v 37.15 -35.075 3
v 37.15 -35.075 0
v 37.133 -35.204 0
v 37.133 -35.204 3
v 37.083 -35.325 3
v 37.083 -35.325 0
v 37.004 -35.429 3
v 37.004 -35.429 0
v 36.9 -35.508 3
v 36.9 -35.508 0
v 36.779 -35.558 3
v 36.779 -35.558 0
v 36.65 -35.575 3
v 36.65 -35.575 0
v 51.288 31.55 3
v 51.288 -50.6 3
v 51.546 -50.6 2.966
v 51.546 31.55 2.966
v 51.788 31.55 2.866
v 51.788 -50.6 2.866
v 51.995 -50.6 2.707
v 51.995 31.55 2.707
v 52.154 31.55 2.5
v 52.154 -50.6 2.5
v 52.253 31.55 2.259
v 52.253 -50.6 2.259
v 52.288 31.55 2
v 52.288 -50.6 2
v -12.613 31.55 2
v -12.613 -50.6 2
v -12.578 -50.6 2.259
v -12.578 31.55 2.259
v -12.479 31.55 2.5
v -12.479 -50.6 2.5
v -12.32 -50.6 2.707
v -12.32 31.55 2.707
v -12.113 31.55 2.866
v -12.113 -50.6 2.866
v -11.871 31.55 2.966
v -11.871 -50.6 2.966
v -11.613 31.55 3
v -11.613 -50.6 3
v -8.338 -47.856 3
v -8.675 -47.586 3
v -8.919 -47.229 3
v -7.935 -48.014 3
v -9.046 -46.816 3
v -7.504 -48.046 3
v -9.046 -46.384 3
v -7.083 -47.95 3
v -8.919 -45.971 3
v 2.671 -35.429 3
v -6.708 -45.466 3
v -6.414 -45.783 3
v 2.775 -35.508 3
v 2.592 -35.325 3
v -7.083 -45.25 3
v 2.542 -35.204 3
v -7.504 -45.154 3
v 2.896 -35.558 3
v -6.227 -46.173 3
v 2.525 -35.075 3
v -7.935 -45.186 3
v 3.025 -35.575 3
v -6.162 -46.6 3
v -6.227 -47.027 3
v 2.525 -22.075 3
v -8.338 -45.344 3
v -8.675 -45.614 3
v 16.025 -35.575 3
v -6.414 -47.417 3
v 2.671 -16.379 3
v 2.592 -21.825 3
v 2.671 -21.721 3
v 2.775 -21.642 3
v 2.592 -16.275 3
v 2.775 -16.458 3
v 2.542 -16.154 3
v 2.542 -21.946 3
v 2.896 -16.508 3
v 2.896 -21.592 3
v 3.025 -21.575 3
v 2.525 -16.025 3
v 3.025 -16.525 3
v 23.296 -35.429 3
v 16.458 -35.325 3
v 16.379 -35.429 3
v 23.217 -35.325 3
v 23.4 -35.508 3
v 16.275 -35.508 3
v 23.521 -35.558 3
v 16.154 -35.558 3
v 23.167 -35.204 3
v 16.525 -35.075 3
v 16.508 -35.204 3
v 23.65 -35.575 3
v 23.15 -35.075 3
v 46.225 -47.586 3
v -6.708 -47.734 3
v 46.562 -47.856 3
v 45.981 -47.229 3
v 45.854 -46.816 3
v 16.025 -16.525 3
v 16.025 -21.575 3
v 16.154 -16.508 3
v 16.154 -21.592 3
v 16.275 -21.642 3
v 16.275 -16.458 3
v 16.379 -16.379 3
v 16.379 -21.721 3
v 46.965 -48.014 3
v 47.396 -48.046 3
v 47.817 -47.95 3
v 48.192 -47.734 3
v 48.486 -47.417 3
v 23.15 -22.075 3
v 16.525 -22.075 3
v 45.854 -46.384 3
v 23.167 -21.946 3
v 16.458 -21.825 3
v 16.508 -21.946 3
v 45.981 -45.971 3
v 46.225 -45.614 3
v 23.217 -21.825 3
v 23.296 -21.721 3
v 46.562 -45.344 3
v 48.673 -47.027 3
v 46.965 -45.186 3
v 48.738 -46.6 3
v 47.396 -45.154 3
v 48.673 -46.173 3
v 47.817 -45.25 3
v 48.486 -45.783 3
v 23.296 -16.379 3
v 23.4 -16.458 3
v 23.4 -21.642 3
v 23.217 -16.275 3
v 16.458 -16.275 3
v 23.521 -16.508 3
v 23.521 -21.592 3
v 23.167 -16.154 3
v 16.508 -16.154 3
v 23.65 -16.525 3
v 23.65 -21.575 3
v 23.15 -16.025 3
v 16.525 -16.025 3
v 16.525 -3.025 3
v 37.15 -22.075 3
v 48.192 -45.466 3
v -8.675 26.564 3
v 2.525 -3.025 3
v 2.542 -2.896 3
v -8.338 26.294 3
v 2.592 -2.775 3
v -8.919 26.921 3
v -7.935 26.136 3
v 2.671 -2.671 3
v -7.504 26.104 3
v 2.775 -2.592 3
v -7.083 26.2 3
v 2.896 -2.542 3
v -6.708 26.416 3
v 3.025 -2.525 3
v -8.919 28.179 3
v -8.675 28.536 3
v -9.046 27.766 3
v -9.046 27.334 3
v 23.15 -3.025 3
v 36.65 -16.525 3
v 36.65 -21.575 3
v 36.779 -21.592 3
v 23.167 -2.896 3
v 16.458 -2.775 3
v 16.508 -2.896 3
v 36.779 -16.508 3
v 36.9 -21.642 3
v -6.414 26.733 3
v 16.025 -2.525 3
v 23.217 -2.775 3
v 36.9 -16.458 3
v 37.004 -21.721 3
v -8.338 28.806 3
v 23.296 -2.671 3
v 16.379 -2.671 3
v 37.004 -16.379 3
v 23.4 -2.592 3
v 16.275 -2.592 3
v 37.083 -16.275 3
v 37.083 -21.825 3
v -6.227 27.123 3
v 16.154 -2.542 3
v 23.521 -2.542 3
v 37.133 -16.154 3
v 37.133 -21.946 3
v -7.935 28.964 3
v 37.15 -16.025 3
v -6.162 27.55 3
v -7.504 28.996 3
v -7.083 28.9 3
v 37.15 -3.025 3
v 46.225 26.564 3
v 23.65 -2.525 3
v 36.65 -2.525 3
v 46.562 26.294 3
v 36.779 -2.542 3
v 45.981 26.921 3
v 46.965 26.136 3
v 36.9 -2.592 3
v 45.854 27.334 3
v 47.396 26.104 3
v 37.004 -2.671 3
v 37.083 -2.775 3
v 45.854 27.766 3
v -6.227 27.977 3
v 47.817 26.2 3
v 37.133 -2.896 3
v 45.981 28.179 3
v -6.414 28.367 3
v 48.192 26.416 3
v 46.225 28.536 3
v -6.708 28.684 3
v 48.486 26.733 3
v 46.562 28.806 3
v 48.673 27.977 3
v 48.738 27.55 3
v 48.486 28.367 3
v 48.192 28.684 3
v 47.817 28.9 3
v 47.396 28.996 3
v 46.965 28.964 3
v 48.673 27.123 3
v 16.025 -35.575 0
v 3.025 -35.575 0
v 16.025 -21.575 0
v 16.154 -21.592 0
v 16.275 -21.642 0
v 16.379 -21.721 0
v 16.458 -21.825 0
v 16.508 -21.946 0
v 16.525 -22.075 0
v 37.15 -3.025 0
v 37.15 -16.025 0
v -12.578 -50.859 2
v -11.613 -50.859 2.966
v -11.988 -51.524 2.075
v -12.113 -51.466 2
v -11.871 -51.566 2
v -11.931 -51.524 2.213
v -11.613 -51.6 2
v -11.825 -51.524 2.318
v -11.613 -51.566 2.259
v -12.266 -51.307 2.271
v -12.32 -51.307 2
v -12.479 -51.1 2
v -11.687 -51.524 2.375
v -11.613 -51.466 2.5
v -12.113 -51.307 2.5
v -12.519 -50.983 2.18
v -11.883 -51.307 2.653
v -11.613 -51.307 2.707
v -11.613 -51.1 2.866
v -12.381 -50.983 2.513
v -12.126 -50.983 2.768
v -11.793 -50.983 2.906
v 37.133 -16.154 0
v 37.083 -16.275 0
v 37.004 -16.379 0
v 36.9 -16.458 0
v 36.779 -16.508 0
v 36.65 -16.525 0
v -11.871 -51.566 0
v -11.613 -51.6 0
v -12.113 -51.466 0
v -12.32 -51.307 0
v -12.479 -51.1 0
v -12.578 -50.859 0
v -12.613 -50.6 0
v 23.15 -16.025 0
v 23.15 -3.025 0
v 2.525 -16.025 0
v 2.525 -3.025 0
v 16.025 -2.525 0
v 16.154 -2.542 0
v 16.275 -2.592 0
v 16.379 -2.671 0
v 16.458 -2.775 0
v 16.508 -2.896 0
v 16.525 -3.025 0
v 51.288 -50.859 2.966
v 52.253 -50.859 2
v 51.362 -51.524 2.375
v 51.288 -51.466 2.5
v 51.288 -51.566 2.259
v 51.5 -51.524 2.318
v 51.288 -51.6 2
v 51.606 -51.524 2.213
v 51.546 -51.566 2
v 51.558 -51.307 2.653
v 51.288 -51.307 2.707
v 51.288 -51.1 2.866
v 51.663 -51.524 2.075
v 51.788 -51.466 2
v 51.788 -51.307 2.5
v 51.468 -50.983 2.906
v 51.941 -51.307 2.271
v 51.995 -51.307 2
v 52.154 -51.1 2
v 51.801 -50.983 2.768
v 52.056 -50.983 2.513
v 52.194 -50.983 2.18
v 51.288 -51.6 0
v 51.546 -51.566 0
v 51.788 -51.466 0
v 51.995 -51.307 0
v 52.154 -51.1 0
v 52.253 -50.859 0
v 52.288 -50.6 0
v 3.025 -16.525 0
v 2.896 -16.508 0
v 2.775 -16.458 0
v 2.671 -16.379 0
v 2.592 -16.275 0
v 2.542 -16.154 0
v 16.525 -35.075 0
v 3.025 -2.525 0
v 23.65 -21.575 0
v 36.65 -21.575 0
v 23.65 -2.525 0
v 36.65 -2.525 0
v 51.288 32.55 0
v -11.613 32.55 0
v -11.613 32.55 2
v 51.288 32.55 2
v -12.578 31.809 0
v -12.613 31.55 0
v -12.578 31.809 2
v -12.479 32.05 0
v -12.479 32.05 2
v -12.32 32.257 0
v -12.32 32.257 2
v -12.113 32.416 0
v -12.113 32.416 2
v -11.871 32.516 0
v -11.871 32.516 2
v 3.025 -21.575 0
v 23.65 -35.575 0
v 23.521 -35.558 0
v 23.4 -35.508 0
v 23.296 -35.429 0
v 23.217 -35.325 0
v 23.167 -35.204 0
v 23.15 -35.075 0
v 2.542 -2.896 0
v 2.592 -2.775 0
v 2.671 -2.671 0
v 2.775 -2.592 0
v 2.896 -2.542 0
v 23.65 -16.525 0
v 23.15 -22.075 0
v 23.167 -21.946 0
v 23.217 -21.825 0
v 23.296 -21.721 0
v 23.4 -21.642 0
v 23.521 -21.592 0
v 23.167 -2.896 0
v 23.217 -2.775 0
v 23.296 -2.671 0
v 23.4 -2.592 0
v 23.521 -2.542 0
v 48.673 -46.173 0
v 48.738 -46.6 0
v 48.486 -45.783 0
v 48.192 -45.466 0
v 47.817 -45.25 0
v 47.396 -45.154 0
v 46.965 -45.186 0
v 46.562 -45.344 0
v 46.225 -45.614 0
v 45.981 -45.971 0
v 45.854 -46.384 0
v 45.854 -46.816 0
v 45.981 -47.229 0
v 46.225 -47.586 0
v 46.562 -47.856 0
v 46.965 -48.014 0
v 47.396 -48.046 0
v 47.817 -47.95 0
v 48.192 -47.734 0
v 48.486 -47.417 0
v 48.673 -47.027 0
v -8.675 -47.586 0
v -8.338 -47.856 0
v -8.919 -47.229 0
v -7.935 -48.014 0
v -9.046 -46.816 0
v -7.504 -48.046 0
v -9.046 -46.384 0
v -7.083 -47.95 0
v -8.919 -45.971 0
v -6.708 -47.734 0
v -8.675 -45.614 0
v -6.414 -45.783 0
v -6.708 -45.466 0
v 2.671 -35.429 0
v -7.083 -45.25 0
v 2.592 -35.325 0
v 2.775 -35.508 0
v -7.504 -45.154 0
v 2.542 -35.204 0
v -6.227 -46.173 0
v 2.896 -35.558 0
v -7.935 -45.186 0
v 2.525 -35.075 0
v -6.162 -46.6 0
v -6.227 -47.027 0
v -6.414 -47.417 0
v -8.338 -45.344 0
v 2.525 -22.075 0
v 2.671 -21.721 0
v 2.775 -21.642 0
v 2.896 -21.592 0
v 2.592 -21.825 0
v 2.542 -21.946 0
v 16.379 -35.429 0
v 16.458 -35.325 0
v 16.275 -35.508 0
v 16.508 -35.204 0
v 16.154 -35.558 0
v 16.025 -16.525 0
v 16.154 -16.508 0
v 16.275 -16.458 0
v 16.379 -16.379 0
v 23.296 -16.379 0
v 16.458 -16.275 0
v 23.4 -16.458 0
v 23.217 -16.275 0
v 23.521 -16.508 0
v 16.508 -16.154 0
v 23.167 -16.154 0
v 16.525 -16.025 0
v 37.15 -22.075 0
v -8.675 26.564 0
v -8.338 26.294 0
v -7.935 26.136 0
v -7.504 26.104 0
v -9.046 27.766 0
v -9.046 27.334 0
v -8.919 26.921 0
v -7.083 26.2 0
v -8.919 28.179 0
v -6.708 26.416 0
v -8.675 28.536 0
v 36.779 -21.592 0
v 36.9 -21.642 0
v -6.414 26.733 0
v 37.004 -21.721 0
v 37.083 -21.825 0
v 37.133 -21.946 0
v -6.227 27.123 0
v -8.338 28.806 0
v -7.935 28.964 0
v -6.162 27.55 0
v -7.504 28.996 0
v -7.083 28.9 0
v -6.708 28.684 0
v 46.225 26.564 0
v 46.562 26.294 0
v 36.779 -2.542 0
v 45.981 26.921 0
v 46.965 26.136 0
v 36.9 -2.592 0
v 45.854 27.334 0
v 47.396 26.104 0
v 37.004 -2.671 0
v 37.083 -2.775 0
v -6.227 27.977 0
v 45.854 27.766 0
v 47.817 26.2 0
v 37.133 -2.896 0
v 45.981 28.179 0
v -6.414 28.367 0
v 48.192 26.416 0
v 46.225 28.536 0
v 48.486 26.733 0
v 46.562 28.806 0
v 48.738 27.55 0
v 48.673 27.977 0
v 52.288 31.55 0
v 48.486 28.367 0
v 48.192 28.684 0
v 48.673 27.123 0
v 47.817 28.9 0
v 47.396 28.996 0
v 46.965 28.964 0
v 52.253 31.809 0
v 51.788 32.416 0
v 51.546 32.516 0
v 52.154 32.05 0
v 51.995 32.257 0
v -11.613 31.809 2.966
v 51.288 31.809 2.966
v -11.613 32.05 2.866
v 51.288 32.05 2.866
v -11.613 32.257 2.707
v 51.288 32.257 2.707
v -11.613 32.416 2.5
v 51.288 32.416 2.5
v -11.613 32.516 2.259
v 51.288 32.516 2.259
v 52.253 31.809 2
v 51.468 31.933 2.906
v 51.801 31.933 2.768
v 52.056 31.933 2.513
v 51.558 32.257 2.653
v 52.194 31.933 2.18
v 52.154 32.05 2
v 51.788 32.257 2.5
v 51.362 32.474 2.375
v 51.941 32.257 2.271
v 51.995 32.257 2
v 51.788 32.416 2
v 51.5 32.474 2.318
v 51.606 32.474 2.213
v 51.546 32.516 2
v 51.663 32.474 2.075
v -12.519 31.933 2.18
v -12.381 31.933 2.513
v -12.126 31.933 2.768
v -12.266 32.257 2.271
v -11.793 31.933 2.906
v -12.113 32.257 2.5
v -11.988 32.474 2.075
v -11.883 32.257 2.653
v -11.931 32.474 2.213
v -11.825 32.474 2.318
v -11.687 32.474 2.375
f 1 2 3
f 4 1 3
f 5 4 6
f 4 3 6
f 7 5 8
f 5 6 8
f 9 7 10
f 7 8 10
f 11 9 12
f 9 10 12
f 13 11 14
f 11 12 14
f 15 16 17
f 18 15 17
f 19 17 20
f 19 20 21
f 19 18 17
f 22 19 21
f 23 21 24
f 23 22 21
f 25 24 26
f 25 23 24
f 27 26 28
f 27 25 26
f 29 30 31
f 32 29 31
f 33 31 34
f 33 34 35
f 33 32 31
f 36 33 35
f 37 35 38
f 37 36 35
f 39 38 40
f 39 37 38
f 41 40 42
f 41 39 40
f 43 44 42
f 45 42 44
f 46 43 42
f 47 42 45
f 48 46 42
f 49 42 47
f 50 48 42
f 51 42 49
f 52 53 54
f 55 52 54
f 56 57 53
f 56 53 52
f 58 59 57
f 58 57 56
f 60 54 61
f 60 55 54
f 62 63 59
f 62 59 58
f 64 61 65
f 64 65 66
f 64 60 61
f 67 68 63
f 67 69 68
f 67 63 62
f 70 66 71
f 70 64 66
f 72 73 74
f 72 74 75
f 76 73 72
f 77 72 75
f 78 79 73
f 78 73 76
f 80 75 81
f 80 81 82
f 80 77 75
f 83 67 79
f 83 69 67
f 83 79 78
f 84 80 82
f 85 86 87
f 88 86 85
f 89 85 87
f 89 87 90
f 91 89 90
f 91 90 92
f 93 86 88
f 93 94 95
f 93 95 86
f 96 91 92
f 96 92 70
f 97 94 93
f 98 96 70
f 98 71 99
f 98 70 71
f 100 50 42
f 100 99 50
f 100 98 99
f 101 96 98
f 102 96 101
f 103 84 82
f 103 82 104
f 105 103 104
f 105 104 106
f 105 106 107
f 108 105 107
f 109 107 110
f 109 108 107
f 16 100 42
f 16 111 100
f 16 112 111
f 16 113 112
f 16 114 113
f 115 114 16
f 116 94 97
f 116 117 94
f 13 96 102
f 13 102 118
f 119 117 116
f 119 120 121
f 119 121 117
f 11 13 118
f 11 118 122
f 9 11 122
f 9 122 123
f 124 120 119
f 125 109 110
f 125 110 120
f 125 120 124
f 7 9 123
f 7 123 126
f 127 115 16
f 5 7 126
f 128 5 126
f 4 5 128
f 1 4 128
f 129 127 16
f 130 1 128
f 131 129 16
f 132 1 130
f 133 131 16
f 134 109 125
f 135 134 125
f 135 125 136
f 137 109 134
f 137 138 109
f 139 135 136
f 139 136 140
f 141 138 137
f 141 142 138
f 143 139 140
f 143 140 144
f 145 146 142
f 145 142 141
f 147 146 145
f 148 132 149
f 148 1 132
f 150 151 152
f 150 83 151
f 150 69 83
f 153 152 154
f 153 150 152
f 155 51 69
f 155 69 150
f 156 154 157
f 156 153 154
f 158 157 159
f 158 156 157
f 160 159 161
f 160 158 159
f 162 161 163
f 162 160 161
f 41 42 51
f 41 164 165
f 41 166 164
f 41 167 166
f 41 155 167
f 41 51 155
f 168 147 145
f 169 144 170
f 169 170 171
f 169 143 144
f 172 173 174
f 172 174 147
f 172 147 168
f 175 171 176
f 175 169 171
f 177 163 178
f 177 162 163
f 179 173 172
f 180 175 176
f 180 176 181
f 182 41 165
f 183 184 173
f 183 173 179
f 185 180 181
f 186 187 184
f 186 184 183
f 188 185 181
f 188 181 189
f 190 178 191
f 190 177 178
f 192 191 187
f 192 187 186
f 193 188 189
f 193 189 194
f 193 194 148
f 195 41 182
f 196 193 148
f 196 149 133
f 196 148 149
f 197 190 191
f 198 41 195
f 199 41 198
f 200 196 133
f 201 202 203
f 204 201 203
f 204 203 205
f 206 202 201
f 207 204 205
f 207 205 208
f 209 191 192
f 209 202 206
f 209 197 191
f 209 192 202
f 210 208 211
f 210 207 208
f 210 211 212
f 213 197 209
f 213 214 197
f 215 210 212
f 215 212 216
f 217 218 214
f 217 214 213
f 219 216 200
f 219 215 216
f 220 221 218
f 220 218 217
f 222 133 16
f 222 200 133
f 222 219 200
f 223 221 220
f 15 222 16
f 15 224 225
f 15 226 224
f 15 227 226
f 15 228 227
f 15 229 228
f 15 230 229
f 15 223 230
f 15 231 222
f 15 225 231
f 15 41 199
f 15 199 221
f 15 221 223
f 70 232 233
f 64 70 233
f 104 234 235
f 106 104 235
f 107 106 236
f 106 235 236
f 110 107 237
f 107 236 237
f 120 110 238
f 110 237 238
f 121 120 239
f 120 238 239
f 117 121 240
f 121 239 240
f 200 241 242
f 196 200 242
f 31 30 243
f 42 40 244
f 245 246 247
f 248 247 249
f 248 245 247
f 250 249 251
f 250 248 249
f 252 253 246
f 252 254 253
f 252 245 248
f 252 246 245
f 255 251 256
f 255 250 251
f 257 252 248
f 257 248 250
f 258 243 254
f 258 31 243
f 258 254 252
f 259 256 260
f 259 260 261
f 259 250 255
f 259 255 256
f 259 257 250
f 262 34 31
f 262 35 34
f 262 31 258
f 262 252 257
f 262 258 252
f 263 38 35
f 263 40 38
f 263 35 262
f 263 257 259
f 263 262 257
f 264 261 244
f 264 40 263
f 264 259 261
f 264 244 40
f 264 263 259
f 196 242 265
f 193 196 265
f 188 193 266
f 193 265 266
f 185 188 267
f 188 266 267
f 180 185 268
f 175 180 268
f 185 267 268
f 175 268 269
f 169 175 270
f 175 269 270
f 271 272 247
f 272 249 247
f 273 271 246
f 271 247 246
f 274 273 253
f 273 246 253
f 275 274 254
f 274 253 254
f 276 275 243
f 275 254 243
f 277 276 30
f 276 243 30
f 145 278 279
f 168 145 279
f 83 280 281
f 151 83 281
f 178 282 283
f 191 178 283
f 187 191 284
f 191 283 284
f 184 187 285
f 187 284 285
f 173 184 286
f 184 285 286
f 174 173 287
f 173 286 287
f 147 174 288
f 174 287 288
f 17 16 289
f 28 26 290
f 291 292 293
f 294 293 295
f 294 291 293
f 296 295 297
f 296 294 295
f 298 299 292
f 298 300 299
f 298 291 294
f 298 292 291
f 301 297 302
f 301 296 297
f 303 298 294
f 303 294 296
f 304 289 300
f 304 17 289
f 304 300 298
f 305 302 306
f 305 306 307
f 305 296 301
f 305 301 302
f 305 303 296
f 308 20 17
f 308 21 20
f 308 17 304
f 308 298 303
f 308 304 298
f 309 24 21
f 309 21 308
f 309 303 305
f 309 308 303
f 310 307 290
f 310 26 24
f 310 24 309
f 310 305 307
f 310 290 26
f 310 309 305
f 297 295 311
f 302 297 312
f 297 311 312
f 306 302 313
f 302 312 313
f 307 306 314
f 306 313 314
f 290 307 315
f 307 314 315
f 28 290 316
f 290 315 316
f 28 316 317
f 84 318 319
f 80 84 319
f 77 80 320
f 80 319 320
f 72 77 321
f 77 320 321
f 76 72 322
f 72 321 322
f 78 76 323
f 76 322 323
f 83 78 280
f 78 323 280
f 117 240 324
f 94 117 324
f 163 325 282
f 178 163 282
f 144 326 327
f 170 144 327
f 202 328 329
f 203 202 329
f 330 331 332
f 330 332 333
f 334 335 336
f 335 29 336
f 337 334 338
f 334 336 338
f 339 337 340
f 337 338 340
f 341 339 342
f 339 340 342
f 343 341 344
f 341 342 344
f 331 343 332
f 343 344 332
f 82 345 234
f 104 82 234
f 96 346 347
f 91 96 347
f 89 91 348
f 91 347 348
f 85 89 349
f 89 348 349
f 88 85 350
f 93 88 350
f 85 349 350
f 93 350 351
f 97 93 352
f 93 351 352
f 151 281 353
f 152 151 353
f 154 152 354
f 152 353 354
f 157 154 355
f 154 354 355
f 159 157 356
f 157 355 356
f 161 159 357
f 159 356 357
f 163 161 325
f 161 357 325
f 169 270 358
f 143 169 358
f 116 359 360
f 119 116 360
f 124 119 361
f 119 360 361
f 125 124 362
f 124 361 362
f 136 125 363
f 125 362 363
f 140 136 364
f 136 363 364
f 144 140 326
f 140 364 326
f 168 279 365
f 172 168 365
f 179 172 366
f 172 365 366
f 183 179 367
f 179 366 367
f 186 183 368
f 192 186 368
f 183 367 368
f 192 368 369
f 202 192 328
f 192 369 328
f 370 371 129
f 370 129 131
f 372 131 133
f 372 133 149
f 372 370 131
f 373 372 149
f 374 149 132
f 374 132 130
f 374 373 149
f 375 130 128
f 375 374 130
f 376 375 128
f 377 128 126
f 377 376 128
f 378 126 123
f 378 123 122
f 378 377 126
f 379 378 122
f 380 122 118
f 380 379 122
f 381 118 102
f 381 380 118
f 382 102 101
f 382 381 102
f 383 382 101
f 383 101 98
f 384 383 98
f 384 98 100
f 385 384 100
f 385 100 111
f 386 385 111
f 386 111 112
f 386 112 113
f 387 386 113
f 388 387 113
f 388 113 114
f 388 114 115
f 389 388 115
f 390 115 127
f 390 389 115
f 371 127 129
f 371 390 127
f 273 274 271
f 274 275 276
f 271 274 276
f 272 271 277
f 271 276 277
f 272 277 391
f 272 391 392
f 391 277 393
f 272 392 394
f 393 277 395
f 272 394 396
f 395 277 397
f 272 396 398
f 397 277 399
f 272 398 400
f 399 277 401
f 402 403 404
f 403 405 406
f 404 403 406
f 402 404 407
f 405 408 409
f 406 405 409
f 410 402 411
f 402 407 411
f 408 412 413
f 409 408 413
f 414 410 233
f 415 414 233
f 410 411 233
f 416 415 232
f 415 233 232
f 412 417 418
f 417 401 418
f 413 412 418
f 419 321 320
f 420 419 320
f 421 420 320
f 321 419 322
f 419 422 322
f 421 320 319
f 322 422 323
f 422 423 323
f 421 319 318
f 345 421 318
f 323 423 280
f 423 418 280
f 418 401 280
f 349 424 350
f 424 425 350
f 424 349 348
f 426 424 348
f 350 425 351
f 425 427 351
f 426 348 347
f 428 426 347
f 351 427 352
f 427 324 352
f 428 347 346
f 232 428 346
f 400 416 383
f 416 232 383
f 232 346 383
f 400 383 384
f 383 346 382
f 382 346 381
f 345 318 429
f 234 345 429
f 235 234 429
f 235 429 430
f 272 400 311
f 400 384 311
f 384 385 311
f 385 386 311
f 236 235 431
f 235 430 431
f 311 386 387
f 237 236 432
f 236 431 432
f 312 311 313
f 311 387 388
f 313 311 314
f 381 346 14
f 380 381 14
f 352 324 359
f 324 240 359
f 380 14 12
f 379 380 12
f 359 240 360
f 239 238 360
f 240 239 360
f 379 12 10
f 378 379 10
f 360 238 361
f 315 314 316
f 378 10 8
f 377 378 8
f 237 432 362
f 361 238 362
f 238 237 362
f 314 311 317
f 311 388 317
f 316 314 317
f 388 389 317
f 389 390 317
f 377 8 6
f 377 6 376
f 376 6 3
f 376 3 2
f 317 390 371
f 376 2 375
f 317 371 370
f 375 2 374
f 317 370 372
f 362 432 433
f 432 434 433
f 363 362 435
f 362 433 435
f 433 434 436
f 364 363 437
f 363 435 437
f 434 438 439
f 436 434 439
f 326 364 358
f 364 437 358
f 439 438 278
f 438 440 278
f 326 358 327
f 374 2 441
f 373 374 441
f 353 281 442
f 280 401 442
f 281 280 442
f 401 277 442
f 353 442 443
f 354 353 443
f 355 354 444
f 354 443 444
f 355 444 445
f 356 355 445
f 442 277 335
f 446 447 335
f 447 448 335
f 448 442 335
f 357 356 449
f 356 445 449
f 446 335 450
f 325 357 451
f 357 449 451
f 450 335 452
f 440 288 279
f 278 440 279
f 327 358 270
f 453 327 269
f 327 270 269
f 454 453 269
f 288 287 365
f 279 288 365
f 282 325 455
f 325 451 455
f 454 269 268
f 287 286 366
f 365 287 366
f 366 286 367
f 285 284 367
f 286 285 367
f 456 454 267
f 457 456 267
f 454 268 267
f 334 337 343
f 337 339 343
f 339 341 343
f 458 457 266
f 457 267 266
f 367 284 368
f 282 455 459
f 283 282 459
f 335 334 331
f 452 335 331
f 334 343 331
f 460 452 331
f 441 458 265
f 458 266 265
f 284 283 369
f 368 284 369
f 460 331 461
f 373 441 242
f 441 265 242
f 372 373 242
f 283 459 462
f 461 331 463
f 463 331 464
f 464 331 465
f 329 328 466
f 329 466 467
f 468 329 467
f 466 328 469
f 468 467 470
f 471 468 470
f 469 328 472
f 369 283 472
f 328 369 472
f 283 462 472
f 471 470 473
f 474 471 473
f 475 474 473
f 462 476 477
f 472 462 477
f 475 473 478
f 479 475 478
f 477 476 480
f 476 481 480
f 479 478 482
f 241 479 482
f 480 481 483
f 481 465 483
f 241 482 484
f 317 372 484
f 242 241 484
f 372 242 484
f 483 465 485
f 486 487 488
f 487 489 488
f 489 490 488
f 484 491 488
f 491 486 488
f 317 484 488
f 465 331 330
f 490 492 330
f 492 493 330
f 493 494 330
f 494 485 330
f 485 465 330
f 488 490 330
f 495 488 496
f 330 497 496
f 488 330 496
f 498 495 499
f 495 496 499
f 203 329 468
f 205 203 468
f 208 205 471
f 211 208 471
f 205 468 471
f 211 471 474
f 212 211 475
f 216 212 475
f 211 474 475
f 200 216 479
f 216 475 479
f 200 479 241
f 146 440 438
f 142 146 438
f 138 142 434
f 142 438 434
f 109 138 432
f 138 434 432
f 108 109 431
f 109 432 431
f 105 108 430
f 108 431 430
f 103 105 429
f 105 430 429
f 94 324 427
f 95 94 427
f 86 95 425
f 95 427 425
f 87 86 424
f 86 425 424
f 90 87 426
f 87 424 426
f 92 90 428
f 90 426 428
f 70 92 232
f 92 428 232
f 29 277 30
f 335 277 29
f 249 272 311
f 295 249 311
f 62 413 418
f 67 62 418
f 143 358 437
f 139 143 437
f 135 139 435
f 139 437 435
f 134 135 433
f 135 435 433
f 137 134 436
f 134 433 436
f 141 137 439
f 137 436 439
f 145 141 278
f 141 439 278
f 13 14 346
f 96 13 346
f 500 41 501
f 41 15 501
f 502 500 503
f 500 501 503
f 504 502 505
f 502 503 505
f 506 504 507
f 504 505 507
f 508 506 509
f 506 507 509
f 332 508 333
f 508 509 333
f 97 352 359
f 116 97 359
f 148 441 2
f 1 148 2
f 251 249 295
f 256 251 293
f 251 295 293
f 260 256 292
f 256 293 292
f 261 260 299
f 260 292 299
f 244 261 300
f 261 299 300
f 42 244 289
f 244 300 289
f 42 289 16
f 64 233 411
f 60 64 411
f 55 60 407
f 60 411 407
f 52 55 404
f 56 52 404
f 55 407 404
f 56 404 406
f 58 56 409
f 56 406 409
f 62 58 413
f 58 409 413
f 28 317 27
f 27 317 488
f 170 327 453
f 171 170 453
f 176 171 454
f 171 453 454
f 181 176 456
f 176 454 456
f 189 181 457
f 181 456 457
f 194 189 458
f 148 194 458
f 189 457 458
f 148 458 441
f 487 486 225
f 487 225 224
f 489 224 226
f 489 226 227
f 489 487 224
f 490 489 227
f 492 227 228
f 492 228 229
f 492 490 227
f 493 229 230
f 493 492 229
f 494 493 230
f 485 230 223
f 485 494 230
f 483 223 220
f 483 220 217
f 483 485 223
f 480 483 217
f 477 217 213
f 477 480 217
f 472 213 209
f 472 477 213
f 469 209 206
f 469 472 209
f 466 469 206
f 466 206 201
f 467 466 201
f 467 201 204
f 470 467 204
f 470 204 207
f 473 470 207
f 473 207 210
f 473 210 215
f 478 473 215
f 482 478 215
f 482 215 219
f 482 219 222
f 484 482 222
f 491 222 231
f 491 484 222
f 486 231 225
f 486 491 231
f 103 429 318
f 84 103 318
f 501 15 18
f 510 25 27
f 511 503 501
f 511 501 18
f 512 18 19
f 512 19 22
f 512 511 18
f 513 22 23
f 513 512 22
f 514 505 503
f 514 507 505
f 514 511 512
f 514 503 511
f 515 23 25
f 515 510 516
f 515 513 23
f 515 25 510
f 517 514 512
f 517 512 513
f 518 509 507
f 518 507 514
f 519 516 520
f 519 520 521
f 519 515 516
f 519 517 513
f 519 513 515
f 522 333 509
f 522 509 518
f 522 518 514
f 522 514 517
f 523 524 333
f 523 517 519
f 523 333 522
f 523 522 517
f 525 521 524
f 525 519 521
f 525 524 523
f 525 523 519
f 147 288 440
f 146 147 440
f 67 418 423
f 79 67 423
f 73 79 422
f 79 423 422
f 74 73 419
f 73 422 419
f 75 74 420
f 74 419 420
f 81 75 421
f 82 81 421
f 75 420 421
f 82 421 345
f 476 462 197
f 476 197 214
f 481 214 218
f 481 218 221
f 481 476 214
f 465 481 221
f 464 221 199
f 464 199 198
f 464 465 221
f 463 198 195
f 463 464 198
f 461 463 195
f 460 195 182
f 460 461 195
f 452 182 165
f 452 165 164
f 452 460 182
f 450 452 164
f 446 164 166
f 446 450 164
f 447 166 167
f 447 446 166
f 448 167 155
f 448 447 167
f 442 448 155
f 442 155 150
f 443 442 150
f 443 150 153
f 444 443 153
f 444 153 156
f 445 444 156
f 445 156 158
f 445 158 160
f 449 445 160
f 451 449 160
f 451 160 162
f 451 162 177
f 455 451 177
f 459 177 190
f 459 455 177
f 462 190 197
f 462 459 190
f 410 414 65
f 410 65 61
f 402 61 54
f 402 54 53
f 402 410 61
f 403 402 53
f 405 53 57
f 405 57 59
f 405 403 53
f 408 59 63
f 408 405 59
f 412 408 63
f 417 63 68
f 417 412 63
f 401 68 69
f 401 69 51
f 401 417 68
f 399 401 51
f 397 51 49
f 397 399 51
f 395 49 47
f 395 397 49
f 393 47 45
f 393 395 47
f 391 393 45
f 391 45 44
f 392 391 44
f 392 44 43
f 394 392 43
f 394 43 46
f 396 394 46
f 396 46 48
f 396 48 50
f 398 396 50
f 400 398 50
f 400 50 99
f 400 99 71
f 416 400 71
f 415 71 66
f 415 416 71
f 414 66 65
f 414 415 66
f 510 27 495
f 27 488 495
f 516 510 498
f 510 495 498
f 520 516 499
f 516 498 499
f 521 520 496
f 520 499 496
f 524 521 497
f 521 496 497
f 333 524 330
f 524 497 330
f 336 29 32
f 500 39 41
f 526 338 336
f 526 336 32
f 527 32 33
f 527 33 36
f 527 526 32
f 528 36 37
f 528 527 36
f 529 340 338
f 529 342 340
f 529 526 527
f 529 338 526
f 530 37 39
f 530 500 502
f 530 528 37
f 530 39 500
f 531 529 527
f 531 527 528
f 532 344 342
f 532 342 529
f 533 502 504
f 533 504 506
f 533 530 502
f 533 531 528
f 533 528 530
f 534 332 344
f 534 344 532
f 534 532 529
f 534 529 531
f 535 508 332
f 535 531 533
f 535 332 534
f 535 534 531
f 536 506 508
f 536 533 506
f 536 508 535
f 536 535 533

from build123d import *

# Parameters (mm, degrees)
MODEL_W            = 64.9
MODEL_H            = 84.15
MODEL_R            = 1.45
BOSS_EXTRU_2_DEPTH = 3
CONG_1_R           = 1
CONG_2_R           = 1
CONG_4_R           = 1
CONG_5_R           = 1


with BuildPart() as part:
    # Model → Boss.-Extru.2 (new body)
    with BuildSketch(Plane.XY):
        with Locations((19.8375, -9.525)):
            Rectangle(MODEL_W, MODEL_H)
        with Locations((-7.6125, 27.55)):
            Circle(MODEL_R, mode=Mode.SUBTRACT)
        with Locations((47.2875, 27.55)):
            Circle(MODEL_R, mode=Mode.SUBTRACT)
        with Locations((47.2875, -46.6)):
            Circle(MODEL_R, mode=Mode.SUBTRACT)
        with Locations((-7.6125, -46.6)):
            Circle(MODEL_R, mode=Mode.SUBTRACT)
        with BuildLine():
            Line((3.025, -2.525), (16.025, -2.525))
            ThreePointArc((16.025, -2.525), (16.378553391, -2.671446609), (16.525, -3.025))
            Line((16.525, -3.025), (16.525, -16.025))
            ThreePointArc((16.525, -16.025), (16.378553391, -16.378553391), (16.025, -16.525))
            Line((16.025, -16.525), (3.025, -16.525))
            ThreePointArc((3.025, -16.525), (2.671446609, -16.378553391), (2.525, -16.025))
            Line((2.525, -16.025), (2.525, -3.025))
            ThreePointArc((2.525, -3.025), (2.671446609, -2.671446609), (3.025, -2.525))
        make_face(mode=Mode.SUBTRACT)
        with BuildLine():
            Line((23.65, -2.525), (36.65, -2.525))
            ThreePointArc((36.65, -2.525), (37.003553391, -2.671446609), (37.15, -3.025))
            Line((37.15, -3.025), (37.15, -16.025))
            ThreePointArc((37.15, -16.025), (37.003553391, -16.378553391), (36.65, -16.525))
            Line((36.65, -16.525), (23.65, -16.525))
            ThreePointArc((23.65, -16.525), (23.296446609, -16.378553391), (23.15, -16.025))
            Line((23.15, -16.025), (23.15, -3.025))
            ThreePointArc((23.15, -3.025), (23.296446609, -2.671446609), (23.65, -2.525))
        make_face(mode=Mode.SUBTRACT)
        with BuildLine():
            Line((3.025, -21.575), (16.025, -21.575))
            ThreePointArc((16.025, -21.575), (16.378553391, -21.721446609), (16.525, -22.075))
            Line((16.525, -22.075), (16.525, -35.075))
            ThreePointArc((16.525, -35.075), (16.378553391, -35.428553391), (16.025, -35.575))
            Line((16.025, -35.575), (3.025, -35.575))
            ThreePointArc((3.025, -35.575), (2.671446609, -35.428553391), (2.525, -35.075))
            Line((2.525, -35.075), (2.525, -22.075))
            ThreePointArc((2.525, -22.075), (2.671446609, -21.721446609), (3.025, -21.575))
        make_face(mode=Mode.SUBTRACT)
        with BuildLine():
            Line((23.65, -21.575), (36.65, -21.575))
            ThreePointArc((36.65, -21.575), (37.003553391, -21.721446609), (37.15, -22.075))
            Line((37.15, -22.075), (37.15, -35.075))
            ThreePointArc((37.15, -35.075), (37.003553391, -35.428553391), (36.65, -35.575))
            Line((36.65, -35.575), (23.65, -35.575))
            ThreePointArc((23.65, -35.575), (23.296446609, -35.428553391), (23.15, -35.075))
            Line((23.15, -35.075), (23.15, -22.075))
            ThreePointArc((23.15, -22.075), (23.296446609, -21.721446609), (23.65, -21.575))
        make_face(mode=Mode.SUBTRACT)
    extrude(amount=BOSS_EXTRU_2_DEPTH)

    # Congé1
    cong_1_edges = [part.edges().sort_by_distance(p)[0] for p in [
        (-12.6125, -9.525, 3),
    ]]
    fillet(cong_1_edges, radius=CONG_1_R)

    # Congé2
    cong_2_edges = [part.edges().sort_by_distance(p)[0] for p in [
        (52.2875, -9.525, 3),
    ]]
    fillet(cong_2_edges, radius=CONG_2_R)

    # Congé4
    cong_4_edges = [part.edges().sort_by_distance(p)[0] for p in [
        (19.8375, -51.6, 3),
        (-12.6125, -51.6, 1),
        (-12.319606781, -51.6, 2.707106781),
        (52.2875, -51.6, 1),
        (51.994606781, -51.6, 2.707106781),
    ]]
    fillet(cong_4_edges, radius=CONG_4_R)

    # Congé5
    cong_5_edges = [part.edges().sort_by_distance(p)[0] for p in [
        (-12.6125, 32.55, 1),
        (-12.319606781, 32.55, 2.707106781),
        (19.8375, 32.55, 3),
        (52.2875, 32.55, 1),
        (51.994606781, 32.55, 2.707106781),
    ]]
    fillet(cong_5_edges, radius=CONG_5_R)


solid = part.part
